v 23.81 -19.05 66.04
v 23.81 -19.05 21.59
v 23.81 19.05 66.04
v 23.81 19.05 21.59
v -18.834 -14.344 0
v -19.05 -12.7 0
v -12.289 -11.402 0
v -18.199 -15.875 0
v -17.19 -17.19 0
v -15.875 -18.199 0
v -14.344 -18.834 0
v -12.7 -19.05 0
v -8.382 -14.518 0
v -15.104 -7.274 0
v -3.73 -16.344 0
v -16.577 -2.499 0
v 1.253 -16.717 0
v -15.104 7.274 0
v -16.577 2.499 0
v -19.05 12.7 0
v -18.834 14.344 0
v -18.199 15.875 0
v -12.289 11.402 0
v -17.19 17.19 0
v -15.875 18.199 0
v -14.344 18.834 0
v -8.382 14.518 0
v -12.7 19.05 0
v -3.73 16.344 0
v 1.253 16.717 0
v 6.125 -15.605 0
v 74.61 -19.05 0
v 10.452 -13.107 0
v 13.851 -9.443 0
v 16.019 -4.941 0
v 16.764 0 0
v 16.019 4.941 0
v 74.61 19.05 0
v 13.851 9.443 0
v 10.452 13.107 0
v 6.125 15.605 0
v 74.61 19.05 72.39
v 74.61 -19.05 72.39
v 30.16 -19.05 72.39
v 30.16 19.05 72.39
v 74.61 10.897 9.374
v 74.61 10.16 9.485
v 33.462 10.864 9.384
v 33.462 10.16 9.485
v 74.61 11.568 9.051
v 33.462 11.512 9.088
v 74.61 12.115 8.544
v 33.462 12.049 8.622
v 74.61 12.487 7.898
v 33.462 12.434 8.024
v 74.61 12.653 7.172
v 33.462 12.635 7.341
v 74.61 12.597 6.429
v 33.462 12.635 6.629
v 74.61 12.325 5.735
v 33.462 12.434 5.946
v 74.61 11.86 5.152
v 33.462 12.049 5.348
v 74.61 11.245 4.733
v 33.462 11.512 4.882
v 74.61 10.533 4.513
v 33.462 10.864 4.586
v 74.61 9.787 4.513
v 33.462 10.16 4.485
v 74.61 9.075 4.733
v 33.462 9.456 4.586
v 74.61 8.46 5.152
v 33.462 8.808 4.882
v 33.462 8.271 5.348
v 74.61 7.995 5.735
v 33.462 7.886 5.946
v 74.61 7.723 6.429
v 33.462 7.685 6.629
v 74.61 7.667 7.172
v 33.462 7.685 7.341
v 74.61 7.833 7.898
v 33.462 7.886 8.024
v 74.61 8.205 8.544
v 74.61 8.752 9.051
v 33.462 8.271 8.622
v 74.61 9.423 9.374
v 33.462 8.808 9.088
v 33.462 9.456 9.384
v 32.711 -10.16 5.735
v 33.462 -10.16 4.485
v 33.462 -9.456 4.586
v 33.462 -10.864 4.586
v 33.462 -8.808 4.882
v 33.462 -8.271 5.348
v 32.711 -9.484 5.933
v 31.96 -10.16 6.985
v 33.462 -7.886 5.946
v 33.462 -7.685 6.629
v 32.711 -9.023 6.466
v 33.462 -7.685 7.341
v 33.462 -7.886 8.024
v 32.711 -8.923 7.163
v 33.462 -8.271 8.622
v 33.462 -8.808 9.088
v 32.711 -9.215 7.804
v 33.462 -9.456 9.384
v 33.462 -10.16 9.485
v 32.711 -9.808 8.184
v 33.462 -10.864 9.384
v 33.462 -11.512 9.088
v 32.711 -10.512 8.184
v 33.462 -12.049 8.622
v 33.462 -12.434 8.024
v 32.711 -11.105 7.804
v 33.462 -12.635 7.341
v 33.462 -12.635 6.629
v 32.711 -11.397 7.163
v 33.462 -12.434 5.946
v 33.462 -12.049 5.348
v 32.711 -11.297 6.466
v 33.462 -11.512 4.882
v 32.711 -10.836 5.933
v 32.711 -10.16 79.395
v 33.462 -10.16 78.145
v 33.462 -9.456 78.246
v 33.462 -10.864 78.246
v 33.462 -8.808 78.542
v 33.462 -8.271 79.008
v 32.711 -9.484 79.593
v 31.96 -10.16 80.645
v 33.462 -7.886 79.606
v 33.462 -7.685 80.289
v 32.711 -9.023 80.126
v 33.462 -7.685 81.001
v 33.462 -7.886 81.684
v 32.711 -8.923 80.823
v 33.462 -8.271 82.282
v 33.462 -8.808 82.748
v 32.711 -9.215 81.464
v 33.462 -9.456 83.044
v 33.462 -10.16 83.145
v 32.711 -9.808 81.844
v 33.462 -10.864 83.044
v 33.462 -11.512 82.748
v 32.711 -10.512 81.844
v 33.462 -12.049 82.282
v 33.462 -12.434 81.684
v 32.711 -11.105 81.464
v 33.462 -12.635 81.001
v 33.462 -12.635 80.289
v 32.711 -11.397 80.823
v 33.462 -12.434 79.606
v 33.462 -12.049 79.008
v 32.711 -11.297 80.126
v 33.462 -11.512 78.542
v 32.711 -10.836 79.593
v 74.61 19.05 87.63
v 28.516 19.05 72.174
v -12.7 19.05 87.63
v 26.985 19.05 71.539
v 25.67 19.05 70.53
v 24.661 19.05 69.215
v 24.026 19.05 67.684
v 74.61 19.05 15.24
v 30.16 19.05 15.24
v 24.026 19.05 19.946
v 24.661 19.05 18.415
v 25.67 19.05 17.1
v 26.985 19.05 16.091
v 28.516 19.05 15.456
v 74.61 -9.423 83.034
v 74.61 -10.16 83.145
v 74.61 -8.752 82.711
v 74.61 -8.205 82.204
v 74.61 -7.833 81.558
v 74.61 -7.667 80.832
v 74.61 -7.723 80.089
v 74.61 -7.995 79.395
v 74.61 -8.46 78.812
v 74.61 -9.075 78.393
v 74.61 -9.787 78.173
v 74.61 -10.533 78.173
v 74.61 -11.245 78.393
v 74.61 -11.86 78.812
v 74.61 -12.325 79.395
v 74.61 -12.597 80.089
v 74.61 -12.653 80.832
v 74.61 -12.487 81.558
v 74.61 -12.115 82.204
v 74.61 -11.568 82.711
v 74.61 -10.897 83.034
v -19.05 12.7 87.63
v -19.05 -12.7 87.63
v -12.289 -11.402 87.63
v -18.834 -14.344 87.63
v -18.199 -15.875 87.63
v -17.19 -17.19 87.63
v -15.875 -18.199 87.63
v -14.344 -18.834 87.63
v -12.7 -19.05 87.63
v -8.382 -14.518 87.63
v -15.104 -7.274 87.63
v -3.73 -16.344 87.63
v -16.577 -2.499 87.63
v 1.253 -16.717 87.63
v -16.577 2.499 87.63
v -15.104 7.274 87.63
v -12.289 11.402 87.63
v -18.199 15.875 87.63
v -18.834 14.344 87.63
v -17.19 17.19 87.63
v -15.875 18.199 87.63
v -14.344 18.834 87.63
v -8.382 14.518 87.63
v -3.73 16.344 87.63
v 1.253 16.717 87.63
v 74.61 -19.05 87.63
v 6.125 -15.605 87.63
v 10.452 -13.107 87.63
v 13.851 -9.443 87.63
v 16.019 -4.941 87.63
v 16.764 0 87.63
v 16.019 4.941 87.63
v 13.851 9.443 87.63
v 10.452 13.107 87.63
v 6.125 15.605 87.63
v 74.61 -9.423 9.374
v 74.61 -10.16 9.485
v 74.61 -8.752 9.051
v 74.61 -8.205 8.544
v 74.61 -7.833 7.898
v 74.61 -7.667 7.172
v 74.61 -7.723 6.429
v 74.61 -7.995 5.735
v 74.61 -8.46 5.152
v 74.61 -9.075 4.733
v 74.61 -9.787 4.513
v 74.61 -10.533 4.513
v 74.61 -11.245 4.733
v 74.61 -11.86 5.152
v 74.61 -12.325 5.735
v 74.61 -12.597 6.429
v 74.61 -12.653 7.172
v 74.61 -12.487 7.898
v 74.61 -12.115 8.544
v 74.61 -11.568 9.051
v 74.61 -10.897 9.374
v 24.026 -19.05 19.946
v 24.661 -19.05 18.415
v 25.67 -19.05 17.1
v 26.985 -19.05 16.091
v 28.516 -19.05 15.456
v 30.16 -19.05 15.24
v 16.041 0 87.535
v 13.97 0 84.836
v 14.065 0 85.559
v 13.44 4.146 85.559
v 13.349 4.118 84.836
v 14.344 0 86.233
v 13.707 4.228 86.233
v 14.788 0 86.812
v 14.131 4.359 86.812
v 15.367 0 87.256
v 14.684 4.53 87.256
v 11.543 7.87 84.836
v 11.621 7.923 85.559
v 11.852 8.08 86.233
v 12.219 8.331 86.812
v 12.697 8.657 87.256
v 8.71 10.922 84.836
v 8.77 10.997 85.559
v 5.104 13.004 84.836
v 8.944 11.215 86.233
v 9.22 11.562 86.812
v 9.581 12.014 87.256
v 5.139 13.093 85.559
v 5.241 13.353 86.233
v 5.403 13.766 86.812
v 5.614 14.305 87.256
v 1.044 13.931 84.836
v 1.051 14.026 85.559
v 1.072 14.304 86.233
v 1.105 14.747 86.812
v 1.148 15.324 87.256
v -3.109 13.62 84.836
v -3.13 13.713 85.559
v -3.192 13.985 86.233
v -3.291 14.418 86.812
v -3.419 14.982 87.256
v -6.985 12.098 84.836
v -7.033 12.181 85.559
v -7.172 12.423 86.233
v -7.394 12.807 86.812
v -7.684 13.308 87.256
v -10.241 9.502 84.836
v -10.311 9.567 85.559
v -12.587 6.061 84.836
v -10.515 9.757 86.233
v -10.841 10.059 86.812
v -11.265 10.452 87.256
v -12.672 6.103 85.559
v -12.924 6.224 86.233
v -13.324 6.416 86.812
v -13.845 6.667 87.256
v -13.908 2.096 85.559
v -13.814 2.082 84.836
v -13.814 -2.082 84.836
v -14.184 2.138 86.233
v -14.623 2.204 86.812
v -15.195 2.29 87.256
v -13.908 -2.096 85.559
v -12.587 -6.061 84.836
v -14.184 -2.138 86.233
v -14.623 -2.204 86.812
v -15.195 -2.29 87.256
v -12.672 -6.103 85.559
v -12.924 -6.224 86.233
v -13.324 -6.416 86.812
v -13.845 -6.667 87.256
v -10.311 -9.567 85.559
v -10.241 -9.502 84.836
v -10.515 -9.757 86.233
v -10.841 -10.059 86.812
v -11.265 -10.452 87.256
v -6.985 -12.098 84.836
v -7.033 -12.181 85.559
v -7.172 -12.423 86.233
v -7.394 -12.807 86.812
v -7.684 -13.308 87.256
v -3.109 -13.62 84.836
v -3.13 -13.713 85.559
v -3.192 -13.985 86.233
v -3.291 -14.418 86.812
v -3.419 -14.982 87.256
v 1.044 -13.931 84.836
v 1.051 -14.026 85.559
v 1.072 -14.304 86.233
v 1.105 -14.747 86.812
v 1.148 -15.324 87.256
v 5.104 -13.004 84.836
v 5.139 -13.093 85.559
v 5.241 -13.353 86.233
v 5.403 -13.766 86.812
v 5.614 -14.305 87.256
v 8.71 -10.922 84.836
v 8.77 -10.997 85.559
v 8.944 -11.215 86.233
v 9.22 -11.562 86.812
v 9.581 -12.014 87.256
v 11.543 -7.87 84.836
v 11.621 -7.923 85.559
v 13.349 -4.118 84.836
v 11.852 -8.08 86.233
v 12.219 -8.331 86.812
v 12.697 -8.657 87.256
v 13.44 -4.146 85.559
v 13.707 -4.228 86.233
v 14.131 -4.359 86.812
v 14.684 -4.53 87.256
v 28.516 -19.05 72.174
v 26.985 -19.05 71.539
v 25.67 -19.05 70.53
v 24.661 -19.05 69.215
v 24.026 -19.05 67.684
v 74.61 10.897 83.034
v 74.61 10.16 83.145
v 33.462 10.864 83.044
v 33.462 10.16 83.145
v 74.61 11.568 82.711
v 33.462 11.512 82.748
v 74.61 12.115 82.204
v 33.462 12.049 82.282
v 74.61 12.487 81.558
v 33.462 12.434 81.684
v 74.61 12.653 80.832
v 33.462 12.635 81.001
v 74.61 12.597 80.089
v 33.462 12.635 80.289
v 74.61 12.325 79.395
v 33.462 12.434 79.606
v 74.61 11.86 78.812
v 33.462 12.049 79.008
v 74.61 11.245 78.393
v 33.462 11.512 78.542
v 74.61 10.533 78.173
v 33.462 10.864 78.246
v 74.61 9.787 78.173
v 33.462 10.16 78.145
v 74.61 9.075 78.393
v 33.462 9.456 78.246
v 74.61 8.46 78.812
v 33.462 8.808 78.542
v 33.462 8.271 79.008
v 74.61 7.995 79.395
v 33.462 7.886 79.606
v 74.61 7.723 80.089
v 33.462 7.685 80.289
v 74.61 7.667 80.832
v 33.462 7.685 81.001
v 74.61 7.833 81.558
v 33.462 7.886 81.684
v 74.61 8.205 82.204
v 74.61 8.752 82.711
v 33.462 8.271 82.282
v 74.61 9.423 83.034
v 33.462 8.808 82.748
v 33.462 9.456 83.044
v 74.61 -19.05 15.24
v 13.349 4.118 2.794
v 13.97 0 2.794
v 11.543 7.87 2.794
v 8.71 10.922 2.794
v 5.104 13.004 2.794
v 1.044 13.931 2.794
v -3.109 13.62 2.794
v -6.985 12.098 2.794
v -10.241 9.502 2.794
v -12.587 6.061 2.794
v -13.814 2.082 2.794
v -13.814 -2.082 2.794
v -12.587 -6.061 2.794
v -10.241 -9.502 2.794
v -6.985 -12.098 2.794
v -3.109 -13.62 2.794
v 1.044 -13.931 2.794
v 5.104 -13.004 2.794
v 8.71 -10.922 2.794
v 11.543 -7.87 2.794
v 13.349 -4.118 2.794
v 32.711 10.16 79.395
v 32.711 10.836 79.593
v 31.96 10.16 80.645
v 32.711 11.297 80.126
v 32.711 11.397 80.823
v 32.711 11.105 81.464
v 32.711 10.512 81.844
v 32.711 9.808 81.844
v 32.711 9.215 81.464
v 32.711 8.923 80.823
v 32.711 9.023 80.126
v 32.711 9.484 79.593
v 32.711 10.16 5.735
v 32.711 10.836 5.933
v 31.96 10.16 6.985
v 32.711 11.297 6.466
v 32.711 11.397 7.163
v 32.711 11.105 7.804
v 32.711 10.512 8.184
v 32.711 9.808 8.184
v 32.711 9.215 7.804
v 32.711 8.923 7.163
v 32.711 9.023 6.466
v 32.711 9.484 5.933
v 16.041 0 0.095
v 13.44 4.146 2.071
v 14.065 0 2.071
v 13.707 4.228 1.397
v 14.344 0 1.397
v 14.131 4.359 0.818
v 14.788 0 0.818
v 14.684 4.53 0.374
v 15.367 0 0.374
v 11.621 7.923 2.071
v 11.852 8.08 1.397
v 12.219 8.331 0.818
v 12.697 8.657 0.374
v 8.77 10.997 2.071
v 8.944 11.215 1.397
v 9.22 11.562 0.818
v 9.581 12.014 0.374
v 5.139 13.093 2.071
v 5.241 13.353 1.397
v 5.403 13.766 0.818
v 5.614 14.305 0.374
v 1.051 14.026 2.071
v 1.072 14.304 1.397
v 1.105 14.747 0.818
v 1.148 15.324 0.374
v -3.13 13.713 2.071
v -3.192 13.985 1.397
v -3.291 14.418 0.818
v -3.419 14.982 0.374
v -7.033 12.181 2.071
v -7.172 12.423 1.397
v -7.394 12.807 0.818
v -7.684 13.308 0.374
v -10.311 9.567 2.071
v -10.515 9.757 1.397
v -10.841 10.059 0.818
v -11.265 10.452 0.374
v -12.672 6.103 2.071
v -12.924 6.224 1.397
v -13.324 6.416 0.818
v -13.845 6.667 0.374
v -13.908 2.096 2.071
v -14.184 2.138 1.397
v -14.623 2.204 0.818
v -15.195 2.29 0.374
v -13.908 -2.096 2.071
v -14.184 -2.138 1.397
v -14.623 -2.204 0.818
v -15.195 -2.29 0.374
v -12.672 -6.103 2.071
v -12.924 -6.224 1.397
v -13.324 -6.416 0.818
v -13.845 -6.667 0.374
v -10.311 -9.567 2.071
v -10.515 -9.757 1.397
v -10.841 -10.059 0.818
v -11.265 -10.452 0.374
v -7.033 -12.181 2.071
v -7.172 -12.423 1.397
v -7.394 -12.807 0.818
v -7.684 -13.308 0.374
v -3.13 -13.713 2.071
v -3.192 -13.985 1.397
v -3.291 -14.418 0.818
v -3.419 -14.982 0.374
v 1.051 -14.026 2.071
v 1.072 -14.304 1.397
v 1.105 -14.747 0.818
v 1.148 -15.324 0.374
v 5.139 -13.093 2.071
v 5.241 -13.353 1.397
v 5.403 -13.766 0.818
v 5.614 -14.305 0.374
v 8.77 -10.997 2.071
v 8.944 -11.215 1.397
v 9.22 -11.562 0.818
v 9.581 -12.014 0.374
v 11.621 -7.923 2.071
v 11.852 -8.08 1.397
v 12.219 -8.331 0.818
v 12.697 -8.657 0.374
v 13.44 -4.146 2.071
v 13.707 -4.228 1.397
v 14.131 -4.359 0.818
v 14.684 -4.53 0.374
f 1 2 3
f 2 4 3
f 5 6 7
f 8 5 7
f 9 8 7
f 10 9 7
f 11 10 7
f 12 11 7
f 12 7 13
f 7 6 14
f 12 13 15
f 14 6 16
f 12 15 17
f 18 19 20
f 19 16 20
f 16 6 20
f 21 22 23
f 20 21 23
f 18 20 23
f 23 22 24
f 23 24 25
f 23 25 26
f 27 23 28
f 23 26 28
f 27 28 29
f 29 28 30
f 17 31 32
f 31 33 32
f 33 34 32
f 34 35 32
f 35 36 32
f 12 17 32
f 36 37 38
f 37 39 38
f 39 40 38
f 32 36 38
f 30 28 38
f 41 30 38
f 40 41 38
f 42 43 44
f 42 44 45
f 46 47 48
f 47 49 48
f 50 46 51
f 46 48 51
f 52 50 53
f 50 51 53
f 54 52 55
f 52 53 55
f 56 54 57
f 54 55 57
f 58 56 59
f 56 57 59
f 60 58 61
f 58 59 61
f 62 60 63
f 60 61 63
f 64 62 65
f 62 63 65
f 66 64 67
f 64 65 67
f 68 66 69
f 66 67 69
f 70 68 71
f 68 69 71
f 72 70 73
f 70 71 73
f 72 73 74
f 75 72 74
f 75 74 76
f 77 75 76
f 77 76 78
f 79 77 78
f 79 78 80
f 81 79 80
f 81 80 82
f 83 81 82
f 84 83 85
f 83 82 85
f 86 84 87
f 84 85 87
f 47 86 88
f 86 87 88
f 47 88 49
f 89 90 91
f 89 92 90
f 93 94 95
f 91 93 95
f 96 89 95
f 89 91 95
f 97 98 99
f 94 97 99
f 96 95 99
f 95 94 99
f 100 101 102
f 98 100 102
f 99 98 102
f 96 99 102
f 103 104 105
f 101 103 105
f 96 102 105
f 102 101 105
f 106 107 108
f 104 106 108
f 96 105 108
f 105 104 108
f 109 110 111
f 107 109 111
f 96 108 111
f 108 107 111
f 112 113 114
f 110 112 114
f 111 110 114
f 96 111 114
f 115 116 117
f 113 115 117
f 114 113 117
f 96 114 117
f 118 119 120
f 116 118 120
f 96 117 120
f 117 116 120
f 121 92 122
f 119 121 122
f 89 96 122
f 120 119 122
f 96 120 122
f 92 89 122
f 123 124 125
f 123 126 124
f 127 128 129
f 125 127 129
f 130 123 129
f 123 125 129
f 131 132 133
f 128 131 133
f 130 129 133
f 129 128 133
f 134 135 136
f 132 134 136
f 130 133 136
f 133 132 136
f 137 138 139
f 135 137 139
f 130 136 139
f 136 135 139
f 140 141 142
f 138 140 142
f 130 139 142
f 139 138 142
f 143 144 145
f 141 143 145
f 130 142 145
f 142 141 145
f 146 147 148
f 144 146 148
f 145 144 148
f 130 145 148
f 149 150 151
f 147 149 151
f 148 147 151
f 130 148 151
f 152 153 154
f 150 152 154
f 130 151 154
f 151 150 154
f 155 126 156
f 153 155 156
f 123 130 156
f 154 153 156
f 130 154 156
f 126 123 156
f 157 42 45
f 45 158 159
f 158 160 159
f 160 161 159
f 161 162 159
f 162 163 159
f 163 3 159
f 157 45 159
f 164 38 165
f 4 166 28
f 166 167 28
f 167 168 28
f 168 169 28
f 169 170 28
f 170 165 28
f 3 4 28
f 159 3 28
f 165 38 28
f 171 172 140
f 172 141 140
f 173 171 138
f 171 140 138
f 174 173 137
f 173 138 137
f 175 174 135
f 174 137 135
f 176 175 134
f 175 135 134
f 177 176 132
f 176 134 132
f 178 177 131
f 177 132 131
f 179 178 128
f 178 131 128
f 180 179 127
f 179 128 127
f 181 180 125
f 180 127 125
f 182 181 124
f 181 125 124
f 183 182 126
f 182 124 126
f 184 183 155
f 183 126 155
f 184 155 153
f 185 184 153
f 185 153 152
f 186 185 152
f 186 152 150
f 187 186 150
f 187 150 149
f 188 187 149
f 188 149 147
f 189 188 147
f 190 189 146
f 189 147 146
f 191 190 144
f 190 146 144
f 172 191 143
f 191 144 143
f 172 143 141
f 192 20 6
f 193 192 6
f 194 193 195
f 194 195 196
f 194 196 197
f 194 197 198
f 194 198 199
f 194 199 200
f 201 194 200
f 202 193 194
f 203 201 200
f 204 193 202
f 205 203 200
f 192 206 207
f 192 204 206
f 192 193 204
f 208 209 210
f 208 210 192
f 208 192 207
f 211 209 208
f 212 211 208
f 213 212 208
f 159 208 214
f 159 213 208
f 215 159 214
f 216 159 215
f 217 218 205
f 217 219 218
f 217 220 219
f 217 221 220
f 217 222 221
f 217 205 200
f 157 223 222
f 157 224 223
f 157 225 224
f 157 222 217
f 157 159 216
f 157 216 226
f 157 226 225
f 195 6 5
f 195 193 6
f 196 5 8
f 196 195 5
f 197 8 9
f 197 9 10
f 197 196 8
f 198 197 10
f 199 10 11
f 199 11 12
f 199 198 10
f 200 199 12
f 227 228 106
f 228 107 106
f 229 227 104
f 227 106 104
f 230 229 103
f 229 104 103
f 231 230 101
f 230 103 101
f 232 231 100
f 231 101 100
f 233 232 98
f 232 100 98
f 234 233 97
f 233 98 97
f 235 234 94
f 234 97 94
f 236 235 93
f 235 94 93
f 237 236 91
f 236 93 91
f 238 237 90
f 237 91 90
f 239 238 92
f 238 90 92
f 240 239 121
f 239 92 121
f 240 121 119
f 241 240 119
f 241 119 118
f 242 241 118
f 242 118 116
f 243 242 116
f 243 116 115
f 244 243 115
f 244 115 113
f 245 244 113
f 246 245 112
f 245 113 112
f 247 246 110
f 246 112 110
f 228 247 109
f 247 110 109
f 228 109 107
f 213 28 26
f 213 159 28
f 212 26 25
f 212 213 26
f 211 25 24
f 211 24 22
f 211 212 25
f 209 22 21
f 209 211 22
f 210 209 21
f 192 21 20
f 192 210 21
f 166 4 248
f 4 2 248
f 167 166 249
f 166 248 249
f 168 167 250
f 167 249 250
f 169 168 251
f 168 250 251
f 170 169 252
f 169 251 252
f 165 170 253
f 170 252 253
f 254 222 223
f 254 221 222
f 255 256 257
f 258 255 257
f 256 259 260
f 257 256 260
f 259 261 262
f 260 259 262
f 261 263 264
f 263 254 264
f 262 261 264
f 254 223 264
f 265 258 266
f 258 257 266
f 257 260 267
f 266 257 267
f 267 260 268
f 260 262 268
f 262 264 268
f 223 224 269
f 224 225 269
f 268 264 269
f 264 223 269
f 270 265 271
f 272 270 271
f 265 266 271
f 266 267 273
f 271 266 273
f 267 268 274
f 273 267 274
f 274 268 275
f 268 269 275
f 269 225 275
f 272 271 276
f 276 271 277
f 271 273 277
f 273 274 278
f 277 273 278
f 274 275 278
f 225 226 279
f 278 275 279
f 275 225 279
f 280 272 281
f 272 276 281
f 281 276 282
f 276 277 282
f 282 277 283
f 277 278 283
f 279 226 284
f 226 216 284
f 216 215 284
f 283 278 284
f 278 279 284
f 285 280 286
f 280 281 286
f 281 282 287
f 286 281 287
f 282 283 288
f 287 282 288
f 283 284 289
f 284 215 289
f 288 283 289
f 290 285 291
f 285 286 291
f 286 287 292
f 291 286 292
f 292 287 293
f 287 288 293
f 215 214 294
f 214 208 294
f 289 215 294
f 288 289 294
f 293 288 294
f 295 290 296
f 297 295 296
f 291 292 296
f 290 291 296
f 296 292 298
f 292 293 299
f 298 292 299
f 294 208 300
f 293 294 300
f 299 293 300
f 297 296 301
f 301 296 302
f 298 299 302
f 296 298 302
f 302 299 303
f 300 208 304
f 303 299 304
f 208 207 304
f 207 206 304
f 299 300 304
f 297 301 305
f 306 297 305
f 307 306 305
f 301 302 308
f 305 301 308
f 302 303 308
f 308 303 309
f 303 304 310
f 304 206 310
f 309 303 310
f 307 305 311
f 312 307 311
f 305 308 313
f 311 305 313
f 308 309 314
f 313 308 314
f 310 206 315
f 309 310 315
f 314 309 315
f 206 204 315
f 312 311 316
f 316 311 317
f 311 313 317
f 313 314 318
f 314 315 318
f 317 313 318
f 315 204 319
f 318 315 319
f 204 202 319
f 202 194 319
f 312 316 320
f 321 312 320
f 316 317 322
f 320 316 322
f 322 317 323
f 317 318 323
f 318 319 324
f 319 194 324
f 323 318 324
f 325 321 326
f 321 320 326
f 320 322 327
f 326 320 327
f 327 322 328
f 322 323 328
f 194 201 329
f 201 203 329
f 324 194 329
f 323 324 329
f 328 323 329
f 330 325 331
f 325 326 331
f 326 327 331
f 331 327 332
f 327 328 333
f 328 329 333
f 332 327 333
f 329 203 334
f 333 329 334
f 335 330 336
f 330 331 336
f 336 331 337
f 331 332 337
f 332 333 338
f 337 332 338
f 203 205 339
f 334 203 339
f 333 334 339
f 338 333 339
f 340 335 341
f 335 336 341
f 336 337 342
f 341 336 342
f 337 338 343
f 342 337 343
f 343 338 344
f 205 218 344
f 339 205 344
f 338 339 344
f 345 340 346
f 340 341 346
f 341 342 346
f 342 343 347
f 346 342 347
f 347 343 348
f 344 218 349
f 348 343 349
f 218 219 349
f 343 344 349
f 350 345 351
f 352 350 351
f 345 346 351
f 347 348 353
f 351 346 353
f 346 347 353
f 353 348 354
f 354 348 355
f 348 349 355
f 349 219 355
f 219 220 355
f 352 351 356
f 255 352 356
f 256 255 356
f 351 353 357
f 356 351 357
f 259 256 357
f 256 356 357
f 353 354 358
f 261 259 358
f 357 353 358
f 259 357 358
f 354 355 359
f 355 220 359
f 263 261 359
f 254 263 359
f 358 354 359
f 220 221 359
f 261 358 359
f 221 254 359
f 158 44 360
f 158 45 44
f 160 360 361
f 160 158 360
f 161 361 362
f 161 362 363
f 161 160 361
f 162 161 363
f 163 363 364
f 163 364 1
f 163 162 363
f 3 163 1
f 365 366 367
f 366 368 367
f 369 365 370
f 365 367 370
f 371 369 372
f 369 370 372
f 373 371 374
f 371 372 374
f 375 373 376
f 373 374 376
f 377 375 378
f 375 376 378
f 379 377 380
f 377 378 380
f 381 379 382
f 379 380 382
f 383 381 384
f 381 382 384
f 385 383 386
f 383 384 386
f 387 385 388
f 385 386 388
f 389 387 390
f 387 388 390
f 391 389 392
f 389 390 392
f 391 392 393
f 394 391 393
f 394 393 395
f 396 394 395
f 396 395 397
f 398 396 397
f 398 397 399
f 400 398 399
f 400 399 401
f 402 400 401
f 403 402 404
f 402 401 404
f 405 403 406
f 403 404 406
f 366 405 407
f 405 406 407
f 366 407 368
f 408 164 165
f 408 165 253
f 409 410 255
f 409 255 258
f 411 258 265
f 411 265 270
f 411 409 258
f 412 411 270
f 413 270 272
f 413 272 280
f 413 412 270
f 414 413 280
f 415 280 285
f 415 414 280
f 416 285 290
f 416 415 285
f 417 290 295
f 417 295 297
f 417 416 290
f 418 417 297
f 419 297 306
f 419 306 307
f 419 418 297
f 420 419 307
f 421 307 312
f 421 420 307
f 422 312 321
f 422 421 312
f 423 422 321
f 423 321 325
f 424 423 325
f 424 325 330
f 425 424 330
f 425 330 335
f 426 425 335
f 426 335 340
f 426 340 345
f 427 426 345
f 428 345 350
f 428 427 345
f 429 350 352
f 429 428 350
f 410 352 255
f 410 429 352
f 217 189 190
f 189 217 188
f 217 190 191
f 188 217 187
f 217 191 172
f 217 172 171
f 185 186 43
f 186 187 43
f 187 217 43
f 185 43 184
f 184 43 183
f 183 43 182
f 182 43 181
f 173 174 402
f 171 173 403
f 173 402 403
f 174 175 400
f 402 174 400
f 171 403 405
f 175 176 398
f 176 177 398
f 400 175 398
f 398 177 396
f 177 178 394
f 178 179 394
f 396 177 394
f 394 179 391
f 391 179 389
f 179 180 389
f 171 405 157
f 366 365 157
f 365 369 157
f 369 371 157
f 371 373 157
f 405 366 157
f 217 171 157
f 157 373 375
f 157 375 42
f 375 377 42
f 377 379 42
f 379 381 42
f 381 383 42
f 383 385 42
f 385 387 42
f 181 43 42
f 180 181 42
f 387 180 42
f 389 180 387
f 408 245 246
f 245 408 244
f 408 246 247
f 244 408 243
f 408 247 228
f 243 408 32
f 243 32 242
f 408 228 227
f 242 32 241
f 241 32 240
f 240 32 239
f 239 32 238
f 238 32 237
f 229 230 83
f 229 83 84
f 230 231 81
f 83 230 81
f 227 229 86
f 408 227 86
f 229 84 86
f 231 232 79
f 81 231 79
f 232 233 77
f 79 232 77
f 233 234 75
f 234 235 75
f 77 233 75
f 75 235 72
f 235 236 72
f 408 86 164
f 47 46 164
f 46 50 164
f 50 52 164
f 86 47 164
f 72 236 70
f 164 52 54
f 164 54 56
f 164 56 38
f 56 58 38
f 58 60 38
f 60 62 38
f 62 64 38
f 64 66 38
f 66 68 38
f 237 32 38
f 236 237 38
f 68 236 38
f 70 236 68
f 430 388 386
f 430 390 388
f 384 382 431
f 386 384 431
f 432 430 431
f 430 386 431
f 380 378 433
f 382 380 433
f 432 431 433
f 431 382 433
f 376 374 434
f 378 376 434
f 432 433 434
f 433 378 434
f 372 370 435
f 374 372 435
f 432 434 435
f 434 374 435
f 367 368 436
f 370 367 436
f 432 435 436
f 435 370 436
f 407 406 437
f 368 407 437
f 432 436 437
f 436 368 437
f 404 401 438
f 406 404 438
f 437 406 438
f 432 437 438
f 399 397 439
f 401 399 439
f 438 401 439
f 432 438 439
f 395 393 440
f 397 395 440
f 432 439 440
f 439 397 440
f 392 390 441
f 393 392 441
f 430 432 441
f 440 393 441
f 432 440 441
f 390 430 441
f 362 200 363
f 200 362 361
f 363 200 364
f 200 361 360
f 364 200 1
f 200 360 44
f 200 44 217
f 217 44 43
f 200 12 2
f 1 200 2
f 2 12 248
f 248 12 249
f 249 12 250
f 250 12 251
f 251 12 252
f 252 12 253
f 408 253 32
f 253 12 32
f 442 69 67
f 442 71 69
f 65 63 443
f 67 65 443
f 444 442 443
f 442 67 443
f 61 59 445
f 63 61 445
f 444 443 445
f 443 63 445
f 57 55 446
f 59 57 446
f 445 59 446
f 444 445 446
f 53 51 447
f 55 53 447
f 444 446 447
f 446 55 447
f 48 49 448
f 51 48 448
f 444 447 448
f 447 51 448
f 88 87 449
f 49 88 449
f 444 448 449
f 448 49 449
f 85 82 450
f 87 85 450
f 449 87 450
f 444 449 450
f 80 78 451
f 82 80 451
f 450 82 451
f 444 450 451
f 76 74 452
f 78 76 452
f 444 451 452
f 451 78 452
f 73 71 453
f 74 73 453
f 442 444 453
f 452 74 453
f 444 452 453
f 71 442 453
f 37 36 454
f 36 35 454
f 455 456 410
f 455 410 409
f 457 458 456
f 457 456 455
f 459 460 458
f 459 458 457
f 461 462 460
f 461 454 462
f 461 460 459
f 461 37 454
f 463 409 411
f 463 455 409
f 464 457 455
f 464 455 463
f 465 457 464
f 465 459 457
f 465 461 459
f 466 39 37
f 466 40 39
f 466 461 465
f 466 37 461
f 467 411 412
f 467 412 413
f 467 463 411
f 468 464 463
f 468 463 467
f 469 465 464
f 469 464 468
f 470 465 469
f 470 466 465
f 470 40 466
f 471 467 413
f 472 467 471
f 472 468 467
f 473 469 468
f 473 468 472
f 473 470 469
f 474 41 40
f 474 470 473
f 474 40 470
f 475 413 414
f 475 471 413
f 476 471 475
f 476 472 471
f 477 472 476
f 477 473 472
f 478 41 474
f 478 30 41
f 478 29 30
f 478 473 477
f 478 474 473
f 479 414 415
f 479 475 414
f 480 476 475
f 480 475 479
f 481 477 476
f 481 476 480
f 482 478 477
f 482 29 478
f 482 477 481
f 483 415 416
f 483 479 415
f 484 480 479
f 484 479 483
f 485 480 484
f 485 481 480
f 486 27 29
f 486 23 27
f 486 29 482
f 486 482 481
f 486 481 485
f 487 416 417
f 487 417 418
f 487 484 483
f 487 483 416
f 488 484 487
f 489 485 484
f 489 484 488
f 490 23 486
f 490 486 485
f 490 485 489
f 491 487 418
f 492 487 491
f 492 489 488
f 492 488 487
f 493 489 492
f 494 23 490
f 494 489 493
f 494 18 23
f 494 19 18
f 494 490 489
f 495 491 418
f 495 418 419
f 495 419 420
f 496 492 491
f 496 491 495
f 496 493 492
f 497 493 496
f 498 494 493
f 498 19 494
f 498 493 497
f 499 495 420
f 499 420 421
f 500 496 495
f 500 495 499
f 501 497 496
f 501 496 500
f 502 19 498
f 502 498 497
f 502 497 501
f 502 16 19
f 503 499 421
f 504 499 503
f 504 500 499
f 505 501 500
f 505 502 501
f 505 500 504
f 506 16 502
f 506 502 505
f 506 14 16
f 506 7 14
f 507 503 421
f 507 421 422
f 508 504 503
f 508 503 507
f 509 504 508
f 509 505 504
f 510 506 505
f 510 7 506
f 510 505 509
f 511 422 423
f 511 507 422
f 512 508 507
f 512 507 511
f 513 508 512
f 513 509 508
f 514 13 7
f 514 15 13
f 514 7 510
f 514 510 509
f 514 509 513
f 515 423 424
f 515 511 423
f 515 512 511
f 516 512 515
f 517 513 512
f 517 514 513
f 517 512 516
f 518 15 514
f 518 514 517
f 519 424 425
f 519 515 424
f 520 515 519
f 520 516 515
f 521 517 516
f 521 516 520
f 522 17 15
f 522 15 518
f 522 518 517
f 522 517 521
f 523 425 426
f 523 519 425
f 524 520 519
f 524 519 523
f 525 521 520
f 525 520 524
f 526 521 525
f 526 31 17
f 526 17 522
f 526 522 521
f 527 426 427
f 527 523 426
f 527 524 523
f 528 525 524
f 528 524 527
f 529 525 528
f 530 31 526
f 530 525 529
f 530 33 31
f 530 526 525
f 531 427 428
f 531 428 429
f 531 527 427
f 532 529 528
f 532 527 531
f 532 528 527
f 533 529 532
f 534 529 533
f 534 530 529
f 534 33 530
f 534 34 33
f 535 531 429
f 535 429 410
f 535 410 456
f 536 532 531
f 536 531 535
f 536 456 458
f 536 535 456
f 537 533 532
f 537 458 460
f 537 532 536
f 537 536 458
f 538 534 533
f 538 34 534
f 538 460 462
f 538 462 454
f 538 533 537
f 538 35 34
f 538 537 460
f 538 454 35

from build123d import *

# Parameters (mm, degrees)
SKETCH1_R                 = 13.97
BOSS_EXTRUDE1_DEPTH       = 87.63
FILLET3_R                 = 2.794
M6X1_0_TAPPED_HOLE1_D     = 5
M6X1_0_TAPPED_HOLE1_DEPTH = 41.148
M6X1_0_TAPPED_HOLE1_TIP   = 1.502151548
CUT_EXTRUDE1_DEPTH        = 50.8
FILLET4_R                 = 6.35
FILLET5_R                 = 6.35


with BuildPart() as part:
    # Sketch1 → Boss-Extrude1 (new body)
    with BuildSketch(Plane.XY):
        Polygon((74.609999878, 19.05), (0, 19.05), (-19.05, 19.05), (-19.05, -19.05), (0, -19.05), (74.609999878, -19.05), align=None)
        Circle(SKETCH1_R, mode=Mode.SUBTRACT)
    extrude(amount=BOSS_EXTRUDE1_DEPTH)

    # Fillet3
    fillet3_edges = [part.edges().sort_by_distance(p)[0] for p in [
        (-13.97, 0, 0),
        (-13.97, 0, 87.63),
    ]]
    fillet(fillet3_edges, radius=FILLET3_R)

    # M6x1.0 Tapped Hole1
    with Locations(Plane(origin=(74.609999878, 0, 0), x_dir=(0, 0, -1), z_dir=(1, 0, 0))):
        with Locations((-80.645, -10.16), (-80.645, 10.16), (-6.985, 10.16), (-6.985, -10.16)):
            Hole(M6X1_0_TAPPED_HOLE1_D / 2, depth=M6X1_0_TAPPED_HOLE1_DEPTH)
            with Locations((0, 0, -(M6X1_0_TAPPED_HOLE1_DEPTH + M6X1_0_TAPPED_HOLE1_TIP / 2))):  # 118° drill point
                Cone(0, M6X1_0_TAPPED_HOLE1_D / 2, M6X1_0_TAPPED_HOLE1_TIP, mode=Mode.SUBTRACT)

    # Sketch16 → Cut-Extrude1 (cut)
    with BuildSketch(Plane(origin=(74.609999878, 0, 0), x_dir=(0, 0, -1), z_dir=(1, 0, 0))):
        Polygon((-15.24, 19.05), (-15.24, -19.05), (-72.39, -19.05), (-72.39, 19.05), (-43.815, 19.05), align=None)
    extrude(amount=-CUT_EXTRUDE1_DEPTH, mode=Mode.SUBTRACT)

    # Fillet4
    fillet4_edges = [part.edges().sort_by_distance(p)[0] for p in [
        (23.809999878, 0, 15.24),
        (23.809999878, 0, 72.39),
    ]]
    fillet(fillet4_edges, radius=FILLET4_R)

    # Fillet5
    fillet5_edges = [part.edges().sort_by_distance(p)[0] for p in [
        (-19.05, -19.05, 43.815),
        (-19.05, 19.05, 43.815),
    ]]
    fillet(fillet5_edges, radius=FILLET5_R)


solid = part.part
